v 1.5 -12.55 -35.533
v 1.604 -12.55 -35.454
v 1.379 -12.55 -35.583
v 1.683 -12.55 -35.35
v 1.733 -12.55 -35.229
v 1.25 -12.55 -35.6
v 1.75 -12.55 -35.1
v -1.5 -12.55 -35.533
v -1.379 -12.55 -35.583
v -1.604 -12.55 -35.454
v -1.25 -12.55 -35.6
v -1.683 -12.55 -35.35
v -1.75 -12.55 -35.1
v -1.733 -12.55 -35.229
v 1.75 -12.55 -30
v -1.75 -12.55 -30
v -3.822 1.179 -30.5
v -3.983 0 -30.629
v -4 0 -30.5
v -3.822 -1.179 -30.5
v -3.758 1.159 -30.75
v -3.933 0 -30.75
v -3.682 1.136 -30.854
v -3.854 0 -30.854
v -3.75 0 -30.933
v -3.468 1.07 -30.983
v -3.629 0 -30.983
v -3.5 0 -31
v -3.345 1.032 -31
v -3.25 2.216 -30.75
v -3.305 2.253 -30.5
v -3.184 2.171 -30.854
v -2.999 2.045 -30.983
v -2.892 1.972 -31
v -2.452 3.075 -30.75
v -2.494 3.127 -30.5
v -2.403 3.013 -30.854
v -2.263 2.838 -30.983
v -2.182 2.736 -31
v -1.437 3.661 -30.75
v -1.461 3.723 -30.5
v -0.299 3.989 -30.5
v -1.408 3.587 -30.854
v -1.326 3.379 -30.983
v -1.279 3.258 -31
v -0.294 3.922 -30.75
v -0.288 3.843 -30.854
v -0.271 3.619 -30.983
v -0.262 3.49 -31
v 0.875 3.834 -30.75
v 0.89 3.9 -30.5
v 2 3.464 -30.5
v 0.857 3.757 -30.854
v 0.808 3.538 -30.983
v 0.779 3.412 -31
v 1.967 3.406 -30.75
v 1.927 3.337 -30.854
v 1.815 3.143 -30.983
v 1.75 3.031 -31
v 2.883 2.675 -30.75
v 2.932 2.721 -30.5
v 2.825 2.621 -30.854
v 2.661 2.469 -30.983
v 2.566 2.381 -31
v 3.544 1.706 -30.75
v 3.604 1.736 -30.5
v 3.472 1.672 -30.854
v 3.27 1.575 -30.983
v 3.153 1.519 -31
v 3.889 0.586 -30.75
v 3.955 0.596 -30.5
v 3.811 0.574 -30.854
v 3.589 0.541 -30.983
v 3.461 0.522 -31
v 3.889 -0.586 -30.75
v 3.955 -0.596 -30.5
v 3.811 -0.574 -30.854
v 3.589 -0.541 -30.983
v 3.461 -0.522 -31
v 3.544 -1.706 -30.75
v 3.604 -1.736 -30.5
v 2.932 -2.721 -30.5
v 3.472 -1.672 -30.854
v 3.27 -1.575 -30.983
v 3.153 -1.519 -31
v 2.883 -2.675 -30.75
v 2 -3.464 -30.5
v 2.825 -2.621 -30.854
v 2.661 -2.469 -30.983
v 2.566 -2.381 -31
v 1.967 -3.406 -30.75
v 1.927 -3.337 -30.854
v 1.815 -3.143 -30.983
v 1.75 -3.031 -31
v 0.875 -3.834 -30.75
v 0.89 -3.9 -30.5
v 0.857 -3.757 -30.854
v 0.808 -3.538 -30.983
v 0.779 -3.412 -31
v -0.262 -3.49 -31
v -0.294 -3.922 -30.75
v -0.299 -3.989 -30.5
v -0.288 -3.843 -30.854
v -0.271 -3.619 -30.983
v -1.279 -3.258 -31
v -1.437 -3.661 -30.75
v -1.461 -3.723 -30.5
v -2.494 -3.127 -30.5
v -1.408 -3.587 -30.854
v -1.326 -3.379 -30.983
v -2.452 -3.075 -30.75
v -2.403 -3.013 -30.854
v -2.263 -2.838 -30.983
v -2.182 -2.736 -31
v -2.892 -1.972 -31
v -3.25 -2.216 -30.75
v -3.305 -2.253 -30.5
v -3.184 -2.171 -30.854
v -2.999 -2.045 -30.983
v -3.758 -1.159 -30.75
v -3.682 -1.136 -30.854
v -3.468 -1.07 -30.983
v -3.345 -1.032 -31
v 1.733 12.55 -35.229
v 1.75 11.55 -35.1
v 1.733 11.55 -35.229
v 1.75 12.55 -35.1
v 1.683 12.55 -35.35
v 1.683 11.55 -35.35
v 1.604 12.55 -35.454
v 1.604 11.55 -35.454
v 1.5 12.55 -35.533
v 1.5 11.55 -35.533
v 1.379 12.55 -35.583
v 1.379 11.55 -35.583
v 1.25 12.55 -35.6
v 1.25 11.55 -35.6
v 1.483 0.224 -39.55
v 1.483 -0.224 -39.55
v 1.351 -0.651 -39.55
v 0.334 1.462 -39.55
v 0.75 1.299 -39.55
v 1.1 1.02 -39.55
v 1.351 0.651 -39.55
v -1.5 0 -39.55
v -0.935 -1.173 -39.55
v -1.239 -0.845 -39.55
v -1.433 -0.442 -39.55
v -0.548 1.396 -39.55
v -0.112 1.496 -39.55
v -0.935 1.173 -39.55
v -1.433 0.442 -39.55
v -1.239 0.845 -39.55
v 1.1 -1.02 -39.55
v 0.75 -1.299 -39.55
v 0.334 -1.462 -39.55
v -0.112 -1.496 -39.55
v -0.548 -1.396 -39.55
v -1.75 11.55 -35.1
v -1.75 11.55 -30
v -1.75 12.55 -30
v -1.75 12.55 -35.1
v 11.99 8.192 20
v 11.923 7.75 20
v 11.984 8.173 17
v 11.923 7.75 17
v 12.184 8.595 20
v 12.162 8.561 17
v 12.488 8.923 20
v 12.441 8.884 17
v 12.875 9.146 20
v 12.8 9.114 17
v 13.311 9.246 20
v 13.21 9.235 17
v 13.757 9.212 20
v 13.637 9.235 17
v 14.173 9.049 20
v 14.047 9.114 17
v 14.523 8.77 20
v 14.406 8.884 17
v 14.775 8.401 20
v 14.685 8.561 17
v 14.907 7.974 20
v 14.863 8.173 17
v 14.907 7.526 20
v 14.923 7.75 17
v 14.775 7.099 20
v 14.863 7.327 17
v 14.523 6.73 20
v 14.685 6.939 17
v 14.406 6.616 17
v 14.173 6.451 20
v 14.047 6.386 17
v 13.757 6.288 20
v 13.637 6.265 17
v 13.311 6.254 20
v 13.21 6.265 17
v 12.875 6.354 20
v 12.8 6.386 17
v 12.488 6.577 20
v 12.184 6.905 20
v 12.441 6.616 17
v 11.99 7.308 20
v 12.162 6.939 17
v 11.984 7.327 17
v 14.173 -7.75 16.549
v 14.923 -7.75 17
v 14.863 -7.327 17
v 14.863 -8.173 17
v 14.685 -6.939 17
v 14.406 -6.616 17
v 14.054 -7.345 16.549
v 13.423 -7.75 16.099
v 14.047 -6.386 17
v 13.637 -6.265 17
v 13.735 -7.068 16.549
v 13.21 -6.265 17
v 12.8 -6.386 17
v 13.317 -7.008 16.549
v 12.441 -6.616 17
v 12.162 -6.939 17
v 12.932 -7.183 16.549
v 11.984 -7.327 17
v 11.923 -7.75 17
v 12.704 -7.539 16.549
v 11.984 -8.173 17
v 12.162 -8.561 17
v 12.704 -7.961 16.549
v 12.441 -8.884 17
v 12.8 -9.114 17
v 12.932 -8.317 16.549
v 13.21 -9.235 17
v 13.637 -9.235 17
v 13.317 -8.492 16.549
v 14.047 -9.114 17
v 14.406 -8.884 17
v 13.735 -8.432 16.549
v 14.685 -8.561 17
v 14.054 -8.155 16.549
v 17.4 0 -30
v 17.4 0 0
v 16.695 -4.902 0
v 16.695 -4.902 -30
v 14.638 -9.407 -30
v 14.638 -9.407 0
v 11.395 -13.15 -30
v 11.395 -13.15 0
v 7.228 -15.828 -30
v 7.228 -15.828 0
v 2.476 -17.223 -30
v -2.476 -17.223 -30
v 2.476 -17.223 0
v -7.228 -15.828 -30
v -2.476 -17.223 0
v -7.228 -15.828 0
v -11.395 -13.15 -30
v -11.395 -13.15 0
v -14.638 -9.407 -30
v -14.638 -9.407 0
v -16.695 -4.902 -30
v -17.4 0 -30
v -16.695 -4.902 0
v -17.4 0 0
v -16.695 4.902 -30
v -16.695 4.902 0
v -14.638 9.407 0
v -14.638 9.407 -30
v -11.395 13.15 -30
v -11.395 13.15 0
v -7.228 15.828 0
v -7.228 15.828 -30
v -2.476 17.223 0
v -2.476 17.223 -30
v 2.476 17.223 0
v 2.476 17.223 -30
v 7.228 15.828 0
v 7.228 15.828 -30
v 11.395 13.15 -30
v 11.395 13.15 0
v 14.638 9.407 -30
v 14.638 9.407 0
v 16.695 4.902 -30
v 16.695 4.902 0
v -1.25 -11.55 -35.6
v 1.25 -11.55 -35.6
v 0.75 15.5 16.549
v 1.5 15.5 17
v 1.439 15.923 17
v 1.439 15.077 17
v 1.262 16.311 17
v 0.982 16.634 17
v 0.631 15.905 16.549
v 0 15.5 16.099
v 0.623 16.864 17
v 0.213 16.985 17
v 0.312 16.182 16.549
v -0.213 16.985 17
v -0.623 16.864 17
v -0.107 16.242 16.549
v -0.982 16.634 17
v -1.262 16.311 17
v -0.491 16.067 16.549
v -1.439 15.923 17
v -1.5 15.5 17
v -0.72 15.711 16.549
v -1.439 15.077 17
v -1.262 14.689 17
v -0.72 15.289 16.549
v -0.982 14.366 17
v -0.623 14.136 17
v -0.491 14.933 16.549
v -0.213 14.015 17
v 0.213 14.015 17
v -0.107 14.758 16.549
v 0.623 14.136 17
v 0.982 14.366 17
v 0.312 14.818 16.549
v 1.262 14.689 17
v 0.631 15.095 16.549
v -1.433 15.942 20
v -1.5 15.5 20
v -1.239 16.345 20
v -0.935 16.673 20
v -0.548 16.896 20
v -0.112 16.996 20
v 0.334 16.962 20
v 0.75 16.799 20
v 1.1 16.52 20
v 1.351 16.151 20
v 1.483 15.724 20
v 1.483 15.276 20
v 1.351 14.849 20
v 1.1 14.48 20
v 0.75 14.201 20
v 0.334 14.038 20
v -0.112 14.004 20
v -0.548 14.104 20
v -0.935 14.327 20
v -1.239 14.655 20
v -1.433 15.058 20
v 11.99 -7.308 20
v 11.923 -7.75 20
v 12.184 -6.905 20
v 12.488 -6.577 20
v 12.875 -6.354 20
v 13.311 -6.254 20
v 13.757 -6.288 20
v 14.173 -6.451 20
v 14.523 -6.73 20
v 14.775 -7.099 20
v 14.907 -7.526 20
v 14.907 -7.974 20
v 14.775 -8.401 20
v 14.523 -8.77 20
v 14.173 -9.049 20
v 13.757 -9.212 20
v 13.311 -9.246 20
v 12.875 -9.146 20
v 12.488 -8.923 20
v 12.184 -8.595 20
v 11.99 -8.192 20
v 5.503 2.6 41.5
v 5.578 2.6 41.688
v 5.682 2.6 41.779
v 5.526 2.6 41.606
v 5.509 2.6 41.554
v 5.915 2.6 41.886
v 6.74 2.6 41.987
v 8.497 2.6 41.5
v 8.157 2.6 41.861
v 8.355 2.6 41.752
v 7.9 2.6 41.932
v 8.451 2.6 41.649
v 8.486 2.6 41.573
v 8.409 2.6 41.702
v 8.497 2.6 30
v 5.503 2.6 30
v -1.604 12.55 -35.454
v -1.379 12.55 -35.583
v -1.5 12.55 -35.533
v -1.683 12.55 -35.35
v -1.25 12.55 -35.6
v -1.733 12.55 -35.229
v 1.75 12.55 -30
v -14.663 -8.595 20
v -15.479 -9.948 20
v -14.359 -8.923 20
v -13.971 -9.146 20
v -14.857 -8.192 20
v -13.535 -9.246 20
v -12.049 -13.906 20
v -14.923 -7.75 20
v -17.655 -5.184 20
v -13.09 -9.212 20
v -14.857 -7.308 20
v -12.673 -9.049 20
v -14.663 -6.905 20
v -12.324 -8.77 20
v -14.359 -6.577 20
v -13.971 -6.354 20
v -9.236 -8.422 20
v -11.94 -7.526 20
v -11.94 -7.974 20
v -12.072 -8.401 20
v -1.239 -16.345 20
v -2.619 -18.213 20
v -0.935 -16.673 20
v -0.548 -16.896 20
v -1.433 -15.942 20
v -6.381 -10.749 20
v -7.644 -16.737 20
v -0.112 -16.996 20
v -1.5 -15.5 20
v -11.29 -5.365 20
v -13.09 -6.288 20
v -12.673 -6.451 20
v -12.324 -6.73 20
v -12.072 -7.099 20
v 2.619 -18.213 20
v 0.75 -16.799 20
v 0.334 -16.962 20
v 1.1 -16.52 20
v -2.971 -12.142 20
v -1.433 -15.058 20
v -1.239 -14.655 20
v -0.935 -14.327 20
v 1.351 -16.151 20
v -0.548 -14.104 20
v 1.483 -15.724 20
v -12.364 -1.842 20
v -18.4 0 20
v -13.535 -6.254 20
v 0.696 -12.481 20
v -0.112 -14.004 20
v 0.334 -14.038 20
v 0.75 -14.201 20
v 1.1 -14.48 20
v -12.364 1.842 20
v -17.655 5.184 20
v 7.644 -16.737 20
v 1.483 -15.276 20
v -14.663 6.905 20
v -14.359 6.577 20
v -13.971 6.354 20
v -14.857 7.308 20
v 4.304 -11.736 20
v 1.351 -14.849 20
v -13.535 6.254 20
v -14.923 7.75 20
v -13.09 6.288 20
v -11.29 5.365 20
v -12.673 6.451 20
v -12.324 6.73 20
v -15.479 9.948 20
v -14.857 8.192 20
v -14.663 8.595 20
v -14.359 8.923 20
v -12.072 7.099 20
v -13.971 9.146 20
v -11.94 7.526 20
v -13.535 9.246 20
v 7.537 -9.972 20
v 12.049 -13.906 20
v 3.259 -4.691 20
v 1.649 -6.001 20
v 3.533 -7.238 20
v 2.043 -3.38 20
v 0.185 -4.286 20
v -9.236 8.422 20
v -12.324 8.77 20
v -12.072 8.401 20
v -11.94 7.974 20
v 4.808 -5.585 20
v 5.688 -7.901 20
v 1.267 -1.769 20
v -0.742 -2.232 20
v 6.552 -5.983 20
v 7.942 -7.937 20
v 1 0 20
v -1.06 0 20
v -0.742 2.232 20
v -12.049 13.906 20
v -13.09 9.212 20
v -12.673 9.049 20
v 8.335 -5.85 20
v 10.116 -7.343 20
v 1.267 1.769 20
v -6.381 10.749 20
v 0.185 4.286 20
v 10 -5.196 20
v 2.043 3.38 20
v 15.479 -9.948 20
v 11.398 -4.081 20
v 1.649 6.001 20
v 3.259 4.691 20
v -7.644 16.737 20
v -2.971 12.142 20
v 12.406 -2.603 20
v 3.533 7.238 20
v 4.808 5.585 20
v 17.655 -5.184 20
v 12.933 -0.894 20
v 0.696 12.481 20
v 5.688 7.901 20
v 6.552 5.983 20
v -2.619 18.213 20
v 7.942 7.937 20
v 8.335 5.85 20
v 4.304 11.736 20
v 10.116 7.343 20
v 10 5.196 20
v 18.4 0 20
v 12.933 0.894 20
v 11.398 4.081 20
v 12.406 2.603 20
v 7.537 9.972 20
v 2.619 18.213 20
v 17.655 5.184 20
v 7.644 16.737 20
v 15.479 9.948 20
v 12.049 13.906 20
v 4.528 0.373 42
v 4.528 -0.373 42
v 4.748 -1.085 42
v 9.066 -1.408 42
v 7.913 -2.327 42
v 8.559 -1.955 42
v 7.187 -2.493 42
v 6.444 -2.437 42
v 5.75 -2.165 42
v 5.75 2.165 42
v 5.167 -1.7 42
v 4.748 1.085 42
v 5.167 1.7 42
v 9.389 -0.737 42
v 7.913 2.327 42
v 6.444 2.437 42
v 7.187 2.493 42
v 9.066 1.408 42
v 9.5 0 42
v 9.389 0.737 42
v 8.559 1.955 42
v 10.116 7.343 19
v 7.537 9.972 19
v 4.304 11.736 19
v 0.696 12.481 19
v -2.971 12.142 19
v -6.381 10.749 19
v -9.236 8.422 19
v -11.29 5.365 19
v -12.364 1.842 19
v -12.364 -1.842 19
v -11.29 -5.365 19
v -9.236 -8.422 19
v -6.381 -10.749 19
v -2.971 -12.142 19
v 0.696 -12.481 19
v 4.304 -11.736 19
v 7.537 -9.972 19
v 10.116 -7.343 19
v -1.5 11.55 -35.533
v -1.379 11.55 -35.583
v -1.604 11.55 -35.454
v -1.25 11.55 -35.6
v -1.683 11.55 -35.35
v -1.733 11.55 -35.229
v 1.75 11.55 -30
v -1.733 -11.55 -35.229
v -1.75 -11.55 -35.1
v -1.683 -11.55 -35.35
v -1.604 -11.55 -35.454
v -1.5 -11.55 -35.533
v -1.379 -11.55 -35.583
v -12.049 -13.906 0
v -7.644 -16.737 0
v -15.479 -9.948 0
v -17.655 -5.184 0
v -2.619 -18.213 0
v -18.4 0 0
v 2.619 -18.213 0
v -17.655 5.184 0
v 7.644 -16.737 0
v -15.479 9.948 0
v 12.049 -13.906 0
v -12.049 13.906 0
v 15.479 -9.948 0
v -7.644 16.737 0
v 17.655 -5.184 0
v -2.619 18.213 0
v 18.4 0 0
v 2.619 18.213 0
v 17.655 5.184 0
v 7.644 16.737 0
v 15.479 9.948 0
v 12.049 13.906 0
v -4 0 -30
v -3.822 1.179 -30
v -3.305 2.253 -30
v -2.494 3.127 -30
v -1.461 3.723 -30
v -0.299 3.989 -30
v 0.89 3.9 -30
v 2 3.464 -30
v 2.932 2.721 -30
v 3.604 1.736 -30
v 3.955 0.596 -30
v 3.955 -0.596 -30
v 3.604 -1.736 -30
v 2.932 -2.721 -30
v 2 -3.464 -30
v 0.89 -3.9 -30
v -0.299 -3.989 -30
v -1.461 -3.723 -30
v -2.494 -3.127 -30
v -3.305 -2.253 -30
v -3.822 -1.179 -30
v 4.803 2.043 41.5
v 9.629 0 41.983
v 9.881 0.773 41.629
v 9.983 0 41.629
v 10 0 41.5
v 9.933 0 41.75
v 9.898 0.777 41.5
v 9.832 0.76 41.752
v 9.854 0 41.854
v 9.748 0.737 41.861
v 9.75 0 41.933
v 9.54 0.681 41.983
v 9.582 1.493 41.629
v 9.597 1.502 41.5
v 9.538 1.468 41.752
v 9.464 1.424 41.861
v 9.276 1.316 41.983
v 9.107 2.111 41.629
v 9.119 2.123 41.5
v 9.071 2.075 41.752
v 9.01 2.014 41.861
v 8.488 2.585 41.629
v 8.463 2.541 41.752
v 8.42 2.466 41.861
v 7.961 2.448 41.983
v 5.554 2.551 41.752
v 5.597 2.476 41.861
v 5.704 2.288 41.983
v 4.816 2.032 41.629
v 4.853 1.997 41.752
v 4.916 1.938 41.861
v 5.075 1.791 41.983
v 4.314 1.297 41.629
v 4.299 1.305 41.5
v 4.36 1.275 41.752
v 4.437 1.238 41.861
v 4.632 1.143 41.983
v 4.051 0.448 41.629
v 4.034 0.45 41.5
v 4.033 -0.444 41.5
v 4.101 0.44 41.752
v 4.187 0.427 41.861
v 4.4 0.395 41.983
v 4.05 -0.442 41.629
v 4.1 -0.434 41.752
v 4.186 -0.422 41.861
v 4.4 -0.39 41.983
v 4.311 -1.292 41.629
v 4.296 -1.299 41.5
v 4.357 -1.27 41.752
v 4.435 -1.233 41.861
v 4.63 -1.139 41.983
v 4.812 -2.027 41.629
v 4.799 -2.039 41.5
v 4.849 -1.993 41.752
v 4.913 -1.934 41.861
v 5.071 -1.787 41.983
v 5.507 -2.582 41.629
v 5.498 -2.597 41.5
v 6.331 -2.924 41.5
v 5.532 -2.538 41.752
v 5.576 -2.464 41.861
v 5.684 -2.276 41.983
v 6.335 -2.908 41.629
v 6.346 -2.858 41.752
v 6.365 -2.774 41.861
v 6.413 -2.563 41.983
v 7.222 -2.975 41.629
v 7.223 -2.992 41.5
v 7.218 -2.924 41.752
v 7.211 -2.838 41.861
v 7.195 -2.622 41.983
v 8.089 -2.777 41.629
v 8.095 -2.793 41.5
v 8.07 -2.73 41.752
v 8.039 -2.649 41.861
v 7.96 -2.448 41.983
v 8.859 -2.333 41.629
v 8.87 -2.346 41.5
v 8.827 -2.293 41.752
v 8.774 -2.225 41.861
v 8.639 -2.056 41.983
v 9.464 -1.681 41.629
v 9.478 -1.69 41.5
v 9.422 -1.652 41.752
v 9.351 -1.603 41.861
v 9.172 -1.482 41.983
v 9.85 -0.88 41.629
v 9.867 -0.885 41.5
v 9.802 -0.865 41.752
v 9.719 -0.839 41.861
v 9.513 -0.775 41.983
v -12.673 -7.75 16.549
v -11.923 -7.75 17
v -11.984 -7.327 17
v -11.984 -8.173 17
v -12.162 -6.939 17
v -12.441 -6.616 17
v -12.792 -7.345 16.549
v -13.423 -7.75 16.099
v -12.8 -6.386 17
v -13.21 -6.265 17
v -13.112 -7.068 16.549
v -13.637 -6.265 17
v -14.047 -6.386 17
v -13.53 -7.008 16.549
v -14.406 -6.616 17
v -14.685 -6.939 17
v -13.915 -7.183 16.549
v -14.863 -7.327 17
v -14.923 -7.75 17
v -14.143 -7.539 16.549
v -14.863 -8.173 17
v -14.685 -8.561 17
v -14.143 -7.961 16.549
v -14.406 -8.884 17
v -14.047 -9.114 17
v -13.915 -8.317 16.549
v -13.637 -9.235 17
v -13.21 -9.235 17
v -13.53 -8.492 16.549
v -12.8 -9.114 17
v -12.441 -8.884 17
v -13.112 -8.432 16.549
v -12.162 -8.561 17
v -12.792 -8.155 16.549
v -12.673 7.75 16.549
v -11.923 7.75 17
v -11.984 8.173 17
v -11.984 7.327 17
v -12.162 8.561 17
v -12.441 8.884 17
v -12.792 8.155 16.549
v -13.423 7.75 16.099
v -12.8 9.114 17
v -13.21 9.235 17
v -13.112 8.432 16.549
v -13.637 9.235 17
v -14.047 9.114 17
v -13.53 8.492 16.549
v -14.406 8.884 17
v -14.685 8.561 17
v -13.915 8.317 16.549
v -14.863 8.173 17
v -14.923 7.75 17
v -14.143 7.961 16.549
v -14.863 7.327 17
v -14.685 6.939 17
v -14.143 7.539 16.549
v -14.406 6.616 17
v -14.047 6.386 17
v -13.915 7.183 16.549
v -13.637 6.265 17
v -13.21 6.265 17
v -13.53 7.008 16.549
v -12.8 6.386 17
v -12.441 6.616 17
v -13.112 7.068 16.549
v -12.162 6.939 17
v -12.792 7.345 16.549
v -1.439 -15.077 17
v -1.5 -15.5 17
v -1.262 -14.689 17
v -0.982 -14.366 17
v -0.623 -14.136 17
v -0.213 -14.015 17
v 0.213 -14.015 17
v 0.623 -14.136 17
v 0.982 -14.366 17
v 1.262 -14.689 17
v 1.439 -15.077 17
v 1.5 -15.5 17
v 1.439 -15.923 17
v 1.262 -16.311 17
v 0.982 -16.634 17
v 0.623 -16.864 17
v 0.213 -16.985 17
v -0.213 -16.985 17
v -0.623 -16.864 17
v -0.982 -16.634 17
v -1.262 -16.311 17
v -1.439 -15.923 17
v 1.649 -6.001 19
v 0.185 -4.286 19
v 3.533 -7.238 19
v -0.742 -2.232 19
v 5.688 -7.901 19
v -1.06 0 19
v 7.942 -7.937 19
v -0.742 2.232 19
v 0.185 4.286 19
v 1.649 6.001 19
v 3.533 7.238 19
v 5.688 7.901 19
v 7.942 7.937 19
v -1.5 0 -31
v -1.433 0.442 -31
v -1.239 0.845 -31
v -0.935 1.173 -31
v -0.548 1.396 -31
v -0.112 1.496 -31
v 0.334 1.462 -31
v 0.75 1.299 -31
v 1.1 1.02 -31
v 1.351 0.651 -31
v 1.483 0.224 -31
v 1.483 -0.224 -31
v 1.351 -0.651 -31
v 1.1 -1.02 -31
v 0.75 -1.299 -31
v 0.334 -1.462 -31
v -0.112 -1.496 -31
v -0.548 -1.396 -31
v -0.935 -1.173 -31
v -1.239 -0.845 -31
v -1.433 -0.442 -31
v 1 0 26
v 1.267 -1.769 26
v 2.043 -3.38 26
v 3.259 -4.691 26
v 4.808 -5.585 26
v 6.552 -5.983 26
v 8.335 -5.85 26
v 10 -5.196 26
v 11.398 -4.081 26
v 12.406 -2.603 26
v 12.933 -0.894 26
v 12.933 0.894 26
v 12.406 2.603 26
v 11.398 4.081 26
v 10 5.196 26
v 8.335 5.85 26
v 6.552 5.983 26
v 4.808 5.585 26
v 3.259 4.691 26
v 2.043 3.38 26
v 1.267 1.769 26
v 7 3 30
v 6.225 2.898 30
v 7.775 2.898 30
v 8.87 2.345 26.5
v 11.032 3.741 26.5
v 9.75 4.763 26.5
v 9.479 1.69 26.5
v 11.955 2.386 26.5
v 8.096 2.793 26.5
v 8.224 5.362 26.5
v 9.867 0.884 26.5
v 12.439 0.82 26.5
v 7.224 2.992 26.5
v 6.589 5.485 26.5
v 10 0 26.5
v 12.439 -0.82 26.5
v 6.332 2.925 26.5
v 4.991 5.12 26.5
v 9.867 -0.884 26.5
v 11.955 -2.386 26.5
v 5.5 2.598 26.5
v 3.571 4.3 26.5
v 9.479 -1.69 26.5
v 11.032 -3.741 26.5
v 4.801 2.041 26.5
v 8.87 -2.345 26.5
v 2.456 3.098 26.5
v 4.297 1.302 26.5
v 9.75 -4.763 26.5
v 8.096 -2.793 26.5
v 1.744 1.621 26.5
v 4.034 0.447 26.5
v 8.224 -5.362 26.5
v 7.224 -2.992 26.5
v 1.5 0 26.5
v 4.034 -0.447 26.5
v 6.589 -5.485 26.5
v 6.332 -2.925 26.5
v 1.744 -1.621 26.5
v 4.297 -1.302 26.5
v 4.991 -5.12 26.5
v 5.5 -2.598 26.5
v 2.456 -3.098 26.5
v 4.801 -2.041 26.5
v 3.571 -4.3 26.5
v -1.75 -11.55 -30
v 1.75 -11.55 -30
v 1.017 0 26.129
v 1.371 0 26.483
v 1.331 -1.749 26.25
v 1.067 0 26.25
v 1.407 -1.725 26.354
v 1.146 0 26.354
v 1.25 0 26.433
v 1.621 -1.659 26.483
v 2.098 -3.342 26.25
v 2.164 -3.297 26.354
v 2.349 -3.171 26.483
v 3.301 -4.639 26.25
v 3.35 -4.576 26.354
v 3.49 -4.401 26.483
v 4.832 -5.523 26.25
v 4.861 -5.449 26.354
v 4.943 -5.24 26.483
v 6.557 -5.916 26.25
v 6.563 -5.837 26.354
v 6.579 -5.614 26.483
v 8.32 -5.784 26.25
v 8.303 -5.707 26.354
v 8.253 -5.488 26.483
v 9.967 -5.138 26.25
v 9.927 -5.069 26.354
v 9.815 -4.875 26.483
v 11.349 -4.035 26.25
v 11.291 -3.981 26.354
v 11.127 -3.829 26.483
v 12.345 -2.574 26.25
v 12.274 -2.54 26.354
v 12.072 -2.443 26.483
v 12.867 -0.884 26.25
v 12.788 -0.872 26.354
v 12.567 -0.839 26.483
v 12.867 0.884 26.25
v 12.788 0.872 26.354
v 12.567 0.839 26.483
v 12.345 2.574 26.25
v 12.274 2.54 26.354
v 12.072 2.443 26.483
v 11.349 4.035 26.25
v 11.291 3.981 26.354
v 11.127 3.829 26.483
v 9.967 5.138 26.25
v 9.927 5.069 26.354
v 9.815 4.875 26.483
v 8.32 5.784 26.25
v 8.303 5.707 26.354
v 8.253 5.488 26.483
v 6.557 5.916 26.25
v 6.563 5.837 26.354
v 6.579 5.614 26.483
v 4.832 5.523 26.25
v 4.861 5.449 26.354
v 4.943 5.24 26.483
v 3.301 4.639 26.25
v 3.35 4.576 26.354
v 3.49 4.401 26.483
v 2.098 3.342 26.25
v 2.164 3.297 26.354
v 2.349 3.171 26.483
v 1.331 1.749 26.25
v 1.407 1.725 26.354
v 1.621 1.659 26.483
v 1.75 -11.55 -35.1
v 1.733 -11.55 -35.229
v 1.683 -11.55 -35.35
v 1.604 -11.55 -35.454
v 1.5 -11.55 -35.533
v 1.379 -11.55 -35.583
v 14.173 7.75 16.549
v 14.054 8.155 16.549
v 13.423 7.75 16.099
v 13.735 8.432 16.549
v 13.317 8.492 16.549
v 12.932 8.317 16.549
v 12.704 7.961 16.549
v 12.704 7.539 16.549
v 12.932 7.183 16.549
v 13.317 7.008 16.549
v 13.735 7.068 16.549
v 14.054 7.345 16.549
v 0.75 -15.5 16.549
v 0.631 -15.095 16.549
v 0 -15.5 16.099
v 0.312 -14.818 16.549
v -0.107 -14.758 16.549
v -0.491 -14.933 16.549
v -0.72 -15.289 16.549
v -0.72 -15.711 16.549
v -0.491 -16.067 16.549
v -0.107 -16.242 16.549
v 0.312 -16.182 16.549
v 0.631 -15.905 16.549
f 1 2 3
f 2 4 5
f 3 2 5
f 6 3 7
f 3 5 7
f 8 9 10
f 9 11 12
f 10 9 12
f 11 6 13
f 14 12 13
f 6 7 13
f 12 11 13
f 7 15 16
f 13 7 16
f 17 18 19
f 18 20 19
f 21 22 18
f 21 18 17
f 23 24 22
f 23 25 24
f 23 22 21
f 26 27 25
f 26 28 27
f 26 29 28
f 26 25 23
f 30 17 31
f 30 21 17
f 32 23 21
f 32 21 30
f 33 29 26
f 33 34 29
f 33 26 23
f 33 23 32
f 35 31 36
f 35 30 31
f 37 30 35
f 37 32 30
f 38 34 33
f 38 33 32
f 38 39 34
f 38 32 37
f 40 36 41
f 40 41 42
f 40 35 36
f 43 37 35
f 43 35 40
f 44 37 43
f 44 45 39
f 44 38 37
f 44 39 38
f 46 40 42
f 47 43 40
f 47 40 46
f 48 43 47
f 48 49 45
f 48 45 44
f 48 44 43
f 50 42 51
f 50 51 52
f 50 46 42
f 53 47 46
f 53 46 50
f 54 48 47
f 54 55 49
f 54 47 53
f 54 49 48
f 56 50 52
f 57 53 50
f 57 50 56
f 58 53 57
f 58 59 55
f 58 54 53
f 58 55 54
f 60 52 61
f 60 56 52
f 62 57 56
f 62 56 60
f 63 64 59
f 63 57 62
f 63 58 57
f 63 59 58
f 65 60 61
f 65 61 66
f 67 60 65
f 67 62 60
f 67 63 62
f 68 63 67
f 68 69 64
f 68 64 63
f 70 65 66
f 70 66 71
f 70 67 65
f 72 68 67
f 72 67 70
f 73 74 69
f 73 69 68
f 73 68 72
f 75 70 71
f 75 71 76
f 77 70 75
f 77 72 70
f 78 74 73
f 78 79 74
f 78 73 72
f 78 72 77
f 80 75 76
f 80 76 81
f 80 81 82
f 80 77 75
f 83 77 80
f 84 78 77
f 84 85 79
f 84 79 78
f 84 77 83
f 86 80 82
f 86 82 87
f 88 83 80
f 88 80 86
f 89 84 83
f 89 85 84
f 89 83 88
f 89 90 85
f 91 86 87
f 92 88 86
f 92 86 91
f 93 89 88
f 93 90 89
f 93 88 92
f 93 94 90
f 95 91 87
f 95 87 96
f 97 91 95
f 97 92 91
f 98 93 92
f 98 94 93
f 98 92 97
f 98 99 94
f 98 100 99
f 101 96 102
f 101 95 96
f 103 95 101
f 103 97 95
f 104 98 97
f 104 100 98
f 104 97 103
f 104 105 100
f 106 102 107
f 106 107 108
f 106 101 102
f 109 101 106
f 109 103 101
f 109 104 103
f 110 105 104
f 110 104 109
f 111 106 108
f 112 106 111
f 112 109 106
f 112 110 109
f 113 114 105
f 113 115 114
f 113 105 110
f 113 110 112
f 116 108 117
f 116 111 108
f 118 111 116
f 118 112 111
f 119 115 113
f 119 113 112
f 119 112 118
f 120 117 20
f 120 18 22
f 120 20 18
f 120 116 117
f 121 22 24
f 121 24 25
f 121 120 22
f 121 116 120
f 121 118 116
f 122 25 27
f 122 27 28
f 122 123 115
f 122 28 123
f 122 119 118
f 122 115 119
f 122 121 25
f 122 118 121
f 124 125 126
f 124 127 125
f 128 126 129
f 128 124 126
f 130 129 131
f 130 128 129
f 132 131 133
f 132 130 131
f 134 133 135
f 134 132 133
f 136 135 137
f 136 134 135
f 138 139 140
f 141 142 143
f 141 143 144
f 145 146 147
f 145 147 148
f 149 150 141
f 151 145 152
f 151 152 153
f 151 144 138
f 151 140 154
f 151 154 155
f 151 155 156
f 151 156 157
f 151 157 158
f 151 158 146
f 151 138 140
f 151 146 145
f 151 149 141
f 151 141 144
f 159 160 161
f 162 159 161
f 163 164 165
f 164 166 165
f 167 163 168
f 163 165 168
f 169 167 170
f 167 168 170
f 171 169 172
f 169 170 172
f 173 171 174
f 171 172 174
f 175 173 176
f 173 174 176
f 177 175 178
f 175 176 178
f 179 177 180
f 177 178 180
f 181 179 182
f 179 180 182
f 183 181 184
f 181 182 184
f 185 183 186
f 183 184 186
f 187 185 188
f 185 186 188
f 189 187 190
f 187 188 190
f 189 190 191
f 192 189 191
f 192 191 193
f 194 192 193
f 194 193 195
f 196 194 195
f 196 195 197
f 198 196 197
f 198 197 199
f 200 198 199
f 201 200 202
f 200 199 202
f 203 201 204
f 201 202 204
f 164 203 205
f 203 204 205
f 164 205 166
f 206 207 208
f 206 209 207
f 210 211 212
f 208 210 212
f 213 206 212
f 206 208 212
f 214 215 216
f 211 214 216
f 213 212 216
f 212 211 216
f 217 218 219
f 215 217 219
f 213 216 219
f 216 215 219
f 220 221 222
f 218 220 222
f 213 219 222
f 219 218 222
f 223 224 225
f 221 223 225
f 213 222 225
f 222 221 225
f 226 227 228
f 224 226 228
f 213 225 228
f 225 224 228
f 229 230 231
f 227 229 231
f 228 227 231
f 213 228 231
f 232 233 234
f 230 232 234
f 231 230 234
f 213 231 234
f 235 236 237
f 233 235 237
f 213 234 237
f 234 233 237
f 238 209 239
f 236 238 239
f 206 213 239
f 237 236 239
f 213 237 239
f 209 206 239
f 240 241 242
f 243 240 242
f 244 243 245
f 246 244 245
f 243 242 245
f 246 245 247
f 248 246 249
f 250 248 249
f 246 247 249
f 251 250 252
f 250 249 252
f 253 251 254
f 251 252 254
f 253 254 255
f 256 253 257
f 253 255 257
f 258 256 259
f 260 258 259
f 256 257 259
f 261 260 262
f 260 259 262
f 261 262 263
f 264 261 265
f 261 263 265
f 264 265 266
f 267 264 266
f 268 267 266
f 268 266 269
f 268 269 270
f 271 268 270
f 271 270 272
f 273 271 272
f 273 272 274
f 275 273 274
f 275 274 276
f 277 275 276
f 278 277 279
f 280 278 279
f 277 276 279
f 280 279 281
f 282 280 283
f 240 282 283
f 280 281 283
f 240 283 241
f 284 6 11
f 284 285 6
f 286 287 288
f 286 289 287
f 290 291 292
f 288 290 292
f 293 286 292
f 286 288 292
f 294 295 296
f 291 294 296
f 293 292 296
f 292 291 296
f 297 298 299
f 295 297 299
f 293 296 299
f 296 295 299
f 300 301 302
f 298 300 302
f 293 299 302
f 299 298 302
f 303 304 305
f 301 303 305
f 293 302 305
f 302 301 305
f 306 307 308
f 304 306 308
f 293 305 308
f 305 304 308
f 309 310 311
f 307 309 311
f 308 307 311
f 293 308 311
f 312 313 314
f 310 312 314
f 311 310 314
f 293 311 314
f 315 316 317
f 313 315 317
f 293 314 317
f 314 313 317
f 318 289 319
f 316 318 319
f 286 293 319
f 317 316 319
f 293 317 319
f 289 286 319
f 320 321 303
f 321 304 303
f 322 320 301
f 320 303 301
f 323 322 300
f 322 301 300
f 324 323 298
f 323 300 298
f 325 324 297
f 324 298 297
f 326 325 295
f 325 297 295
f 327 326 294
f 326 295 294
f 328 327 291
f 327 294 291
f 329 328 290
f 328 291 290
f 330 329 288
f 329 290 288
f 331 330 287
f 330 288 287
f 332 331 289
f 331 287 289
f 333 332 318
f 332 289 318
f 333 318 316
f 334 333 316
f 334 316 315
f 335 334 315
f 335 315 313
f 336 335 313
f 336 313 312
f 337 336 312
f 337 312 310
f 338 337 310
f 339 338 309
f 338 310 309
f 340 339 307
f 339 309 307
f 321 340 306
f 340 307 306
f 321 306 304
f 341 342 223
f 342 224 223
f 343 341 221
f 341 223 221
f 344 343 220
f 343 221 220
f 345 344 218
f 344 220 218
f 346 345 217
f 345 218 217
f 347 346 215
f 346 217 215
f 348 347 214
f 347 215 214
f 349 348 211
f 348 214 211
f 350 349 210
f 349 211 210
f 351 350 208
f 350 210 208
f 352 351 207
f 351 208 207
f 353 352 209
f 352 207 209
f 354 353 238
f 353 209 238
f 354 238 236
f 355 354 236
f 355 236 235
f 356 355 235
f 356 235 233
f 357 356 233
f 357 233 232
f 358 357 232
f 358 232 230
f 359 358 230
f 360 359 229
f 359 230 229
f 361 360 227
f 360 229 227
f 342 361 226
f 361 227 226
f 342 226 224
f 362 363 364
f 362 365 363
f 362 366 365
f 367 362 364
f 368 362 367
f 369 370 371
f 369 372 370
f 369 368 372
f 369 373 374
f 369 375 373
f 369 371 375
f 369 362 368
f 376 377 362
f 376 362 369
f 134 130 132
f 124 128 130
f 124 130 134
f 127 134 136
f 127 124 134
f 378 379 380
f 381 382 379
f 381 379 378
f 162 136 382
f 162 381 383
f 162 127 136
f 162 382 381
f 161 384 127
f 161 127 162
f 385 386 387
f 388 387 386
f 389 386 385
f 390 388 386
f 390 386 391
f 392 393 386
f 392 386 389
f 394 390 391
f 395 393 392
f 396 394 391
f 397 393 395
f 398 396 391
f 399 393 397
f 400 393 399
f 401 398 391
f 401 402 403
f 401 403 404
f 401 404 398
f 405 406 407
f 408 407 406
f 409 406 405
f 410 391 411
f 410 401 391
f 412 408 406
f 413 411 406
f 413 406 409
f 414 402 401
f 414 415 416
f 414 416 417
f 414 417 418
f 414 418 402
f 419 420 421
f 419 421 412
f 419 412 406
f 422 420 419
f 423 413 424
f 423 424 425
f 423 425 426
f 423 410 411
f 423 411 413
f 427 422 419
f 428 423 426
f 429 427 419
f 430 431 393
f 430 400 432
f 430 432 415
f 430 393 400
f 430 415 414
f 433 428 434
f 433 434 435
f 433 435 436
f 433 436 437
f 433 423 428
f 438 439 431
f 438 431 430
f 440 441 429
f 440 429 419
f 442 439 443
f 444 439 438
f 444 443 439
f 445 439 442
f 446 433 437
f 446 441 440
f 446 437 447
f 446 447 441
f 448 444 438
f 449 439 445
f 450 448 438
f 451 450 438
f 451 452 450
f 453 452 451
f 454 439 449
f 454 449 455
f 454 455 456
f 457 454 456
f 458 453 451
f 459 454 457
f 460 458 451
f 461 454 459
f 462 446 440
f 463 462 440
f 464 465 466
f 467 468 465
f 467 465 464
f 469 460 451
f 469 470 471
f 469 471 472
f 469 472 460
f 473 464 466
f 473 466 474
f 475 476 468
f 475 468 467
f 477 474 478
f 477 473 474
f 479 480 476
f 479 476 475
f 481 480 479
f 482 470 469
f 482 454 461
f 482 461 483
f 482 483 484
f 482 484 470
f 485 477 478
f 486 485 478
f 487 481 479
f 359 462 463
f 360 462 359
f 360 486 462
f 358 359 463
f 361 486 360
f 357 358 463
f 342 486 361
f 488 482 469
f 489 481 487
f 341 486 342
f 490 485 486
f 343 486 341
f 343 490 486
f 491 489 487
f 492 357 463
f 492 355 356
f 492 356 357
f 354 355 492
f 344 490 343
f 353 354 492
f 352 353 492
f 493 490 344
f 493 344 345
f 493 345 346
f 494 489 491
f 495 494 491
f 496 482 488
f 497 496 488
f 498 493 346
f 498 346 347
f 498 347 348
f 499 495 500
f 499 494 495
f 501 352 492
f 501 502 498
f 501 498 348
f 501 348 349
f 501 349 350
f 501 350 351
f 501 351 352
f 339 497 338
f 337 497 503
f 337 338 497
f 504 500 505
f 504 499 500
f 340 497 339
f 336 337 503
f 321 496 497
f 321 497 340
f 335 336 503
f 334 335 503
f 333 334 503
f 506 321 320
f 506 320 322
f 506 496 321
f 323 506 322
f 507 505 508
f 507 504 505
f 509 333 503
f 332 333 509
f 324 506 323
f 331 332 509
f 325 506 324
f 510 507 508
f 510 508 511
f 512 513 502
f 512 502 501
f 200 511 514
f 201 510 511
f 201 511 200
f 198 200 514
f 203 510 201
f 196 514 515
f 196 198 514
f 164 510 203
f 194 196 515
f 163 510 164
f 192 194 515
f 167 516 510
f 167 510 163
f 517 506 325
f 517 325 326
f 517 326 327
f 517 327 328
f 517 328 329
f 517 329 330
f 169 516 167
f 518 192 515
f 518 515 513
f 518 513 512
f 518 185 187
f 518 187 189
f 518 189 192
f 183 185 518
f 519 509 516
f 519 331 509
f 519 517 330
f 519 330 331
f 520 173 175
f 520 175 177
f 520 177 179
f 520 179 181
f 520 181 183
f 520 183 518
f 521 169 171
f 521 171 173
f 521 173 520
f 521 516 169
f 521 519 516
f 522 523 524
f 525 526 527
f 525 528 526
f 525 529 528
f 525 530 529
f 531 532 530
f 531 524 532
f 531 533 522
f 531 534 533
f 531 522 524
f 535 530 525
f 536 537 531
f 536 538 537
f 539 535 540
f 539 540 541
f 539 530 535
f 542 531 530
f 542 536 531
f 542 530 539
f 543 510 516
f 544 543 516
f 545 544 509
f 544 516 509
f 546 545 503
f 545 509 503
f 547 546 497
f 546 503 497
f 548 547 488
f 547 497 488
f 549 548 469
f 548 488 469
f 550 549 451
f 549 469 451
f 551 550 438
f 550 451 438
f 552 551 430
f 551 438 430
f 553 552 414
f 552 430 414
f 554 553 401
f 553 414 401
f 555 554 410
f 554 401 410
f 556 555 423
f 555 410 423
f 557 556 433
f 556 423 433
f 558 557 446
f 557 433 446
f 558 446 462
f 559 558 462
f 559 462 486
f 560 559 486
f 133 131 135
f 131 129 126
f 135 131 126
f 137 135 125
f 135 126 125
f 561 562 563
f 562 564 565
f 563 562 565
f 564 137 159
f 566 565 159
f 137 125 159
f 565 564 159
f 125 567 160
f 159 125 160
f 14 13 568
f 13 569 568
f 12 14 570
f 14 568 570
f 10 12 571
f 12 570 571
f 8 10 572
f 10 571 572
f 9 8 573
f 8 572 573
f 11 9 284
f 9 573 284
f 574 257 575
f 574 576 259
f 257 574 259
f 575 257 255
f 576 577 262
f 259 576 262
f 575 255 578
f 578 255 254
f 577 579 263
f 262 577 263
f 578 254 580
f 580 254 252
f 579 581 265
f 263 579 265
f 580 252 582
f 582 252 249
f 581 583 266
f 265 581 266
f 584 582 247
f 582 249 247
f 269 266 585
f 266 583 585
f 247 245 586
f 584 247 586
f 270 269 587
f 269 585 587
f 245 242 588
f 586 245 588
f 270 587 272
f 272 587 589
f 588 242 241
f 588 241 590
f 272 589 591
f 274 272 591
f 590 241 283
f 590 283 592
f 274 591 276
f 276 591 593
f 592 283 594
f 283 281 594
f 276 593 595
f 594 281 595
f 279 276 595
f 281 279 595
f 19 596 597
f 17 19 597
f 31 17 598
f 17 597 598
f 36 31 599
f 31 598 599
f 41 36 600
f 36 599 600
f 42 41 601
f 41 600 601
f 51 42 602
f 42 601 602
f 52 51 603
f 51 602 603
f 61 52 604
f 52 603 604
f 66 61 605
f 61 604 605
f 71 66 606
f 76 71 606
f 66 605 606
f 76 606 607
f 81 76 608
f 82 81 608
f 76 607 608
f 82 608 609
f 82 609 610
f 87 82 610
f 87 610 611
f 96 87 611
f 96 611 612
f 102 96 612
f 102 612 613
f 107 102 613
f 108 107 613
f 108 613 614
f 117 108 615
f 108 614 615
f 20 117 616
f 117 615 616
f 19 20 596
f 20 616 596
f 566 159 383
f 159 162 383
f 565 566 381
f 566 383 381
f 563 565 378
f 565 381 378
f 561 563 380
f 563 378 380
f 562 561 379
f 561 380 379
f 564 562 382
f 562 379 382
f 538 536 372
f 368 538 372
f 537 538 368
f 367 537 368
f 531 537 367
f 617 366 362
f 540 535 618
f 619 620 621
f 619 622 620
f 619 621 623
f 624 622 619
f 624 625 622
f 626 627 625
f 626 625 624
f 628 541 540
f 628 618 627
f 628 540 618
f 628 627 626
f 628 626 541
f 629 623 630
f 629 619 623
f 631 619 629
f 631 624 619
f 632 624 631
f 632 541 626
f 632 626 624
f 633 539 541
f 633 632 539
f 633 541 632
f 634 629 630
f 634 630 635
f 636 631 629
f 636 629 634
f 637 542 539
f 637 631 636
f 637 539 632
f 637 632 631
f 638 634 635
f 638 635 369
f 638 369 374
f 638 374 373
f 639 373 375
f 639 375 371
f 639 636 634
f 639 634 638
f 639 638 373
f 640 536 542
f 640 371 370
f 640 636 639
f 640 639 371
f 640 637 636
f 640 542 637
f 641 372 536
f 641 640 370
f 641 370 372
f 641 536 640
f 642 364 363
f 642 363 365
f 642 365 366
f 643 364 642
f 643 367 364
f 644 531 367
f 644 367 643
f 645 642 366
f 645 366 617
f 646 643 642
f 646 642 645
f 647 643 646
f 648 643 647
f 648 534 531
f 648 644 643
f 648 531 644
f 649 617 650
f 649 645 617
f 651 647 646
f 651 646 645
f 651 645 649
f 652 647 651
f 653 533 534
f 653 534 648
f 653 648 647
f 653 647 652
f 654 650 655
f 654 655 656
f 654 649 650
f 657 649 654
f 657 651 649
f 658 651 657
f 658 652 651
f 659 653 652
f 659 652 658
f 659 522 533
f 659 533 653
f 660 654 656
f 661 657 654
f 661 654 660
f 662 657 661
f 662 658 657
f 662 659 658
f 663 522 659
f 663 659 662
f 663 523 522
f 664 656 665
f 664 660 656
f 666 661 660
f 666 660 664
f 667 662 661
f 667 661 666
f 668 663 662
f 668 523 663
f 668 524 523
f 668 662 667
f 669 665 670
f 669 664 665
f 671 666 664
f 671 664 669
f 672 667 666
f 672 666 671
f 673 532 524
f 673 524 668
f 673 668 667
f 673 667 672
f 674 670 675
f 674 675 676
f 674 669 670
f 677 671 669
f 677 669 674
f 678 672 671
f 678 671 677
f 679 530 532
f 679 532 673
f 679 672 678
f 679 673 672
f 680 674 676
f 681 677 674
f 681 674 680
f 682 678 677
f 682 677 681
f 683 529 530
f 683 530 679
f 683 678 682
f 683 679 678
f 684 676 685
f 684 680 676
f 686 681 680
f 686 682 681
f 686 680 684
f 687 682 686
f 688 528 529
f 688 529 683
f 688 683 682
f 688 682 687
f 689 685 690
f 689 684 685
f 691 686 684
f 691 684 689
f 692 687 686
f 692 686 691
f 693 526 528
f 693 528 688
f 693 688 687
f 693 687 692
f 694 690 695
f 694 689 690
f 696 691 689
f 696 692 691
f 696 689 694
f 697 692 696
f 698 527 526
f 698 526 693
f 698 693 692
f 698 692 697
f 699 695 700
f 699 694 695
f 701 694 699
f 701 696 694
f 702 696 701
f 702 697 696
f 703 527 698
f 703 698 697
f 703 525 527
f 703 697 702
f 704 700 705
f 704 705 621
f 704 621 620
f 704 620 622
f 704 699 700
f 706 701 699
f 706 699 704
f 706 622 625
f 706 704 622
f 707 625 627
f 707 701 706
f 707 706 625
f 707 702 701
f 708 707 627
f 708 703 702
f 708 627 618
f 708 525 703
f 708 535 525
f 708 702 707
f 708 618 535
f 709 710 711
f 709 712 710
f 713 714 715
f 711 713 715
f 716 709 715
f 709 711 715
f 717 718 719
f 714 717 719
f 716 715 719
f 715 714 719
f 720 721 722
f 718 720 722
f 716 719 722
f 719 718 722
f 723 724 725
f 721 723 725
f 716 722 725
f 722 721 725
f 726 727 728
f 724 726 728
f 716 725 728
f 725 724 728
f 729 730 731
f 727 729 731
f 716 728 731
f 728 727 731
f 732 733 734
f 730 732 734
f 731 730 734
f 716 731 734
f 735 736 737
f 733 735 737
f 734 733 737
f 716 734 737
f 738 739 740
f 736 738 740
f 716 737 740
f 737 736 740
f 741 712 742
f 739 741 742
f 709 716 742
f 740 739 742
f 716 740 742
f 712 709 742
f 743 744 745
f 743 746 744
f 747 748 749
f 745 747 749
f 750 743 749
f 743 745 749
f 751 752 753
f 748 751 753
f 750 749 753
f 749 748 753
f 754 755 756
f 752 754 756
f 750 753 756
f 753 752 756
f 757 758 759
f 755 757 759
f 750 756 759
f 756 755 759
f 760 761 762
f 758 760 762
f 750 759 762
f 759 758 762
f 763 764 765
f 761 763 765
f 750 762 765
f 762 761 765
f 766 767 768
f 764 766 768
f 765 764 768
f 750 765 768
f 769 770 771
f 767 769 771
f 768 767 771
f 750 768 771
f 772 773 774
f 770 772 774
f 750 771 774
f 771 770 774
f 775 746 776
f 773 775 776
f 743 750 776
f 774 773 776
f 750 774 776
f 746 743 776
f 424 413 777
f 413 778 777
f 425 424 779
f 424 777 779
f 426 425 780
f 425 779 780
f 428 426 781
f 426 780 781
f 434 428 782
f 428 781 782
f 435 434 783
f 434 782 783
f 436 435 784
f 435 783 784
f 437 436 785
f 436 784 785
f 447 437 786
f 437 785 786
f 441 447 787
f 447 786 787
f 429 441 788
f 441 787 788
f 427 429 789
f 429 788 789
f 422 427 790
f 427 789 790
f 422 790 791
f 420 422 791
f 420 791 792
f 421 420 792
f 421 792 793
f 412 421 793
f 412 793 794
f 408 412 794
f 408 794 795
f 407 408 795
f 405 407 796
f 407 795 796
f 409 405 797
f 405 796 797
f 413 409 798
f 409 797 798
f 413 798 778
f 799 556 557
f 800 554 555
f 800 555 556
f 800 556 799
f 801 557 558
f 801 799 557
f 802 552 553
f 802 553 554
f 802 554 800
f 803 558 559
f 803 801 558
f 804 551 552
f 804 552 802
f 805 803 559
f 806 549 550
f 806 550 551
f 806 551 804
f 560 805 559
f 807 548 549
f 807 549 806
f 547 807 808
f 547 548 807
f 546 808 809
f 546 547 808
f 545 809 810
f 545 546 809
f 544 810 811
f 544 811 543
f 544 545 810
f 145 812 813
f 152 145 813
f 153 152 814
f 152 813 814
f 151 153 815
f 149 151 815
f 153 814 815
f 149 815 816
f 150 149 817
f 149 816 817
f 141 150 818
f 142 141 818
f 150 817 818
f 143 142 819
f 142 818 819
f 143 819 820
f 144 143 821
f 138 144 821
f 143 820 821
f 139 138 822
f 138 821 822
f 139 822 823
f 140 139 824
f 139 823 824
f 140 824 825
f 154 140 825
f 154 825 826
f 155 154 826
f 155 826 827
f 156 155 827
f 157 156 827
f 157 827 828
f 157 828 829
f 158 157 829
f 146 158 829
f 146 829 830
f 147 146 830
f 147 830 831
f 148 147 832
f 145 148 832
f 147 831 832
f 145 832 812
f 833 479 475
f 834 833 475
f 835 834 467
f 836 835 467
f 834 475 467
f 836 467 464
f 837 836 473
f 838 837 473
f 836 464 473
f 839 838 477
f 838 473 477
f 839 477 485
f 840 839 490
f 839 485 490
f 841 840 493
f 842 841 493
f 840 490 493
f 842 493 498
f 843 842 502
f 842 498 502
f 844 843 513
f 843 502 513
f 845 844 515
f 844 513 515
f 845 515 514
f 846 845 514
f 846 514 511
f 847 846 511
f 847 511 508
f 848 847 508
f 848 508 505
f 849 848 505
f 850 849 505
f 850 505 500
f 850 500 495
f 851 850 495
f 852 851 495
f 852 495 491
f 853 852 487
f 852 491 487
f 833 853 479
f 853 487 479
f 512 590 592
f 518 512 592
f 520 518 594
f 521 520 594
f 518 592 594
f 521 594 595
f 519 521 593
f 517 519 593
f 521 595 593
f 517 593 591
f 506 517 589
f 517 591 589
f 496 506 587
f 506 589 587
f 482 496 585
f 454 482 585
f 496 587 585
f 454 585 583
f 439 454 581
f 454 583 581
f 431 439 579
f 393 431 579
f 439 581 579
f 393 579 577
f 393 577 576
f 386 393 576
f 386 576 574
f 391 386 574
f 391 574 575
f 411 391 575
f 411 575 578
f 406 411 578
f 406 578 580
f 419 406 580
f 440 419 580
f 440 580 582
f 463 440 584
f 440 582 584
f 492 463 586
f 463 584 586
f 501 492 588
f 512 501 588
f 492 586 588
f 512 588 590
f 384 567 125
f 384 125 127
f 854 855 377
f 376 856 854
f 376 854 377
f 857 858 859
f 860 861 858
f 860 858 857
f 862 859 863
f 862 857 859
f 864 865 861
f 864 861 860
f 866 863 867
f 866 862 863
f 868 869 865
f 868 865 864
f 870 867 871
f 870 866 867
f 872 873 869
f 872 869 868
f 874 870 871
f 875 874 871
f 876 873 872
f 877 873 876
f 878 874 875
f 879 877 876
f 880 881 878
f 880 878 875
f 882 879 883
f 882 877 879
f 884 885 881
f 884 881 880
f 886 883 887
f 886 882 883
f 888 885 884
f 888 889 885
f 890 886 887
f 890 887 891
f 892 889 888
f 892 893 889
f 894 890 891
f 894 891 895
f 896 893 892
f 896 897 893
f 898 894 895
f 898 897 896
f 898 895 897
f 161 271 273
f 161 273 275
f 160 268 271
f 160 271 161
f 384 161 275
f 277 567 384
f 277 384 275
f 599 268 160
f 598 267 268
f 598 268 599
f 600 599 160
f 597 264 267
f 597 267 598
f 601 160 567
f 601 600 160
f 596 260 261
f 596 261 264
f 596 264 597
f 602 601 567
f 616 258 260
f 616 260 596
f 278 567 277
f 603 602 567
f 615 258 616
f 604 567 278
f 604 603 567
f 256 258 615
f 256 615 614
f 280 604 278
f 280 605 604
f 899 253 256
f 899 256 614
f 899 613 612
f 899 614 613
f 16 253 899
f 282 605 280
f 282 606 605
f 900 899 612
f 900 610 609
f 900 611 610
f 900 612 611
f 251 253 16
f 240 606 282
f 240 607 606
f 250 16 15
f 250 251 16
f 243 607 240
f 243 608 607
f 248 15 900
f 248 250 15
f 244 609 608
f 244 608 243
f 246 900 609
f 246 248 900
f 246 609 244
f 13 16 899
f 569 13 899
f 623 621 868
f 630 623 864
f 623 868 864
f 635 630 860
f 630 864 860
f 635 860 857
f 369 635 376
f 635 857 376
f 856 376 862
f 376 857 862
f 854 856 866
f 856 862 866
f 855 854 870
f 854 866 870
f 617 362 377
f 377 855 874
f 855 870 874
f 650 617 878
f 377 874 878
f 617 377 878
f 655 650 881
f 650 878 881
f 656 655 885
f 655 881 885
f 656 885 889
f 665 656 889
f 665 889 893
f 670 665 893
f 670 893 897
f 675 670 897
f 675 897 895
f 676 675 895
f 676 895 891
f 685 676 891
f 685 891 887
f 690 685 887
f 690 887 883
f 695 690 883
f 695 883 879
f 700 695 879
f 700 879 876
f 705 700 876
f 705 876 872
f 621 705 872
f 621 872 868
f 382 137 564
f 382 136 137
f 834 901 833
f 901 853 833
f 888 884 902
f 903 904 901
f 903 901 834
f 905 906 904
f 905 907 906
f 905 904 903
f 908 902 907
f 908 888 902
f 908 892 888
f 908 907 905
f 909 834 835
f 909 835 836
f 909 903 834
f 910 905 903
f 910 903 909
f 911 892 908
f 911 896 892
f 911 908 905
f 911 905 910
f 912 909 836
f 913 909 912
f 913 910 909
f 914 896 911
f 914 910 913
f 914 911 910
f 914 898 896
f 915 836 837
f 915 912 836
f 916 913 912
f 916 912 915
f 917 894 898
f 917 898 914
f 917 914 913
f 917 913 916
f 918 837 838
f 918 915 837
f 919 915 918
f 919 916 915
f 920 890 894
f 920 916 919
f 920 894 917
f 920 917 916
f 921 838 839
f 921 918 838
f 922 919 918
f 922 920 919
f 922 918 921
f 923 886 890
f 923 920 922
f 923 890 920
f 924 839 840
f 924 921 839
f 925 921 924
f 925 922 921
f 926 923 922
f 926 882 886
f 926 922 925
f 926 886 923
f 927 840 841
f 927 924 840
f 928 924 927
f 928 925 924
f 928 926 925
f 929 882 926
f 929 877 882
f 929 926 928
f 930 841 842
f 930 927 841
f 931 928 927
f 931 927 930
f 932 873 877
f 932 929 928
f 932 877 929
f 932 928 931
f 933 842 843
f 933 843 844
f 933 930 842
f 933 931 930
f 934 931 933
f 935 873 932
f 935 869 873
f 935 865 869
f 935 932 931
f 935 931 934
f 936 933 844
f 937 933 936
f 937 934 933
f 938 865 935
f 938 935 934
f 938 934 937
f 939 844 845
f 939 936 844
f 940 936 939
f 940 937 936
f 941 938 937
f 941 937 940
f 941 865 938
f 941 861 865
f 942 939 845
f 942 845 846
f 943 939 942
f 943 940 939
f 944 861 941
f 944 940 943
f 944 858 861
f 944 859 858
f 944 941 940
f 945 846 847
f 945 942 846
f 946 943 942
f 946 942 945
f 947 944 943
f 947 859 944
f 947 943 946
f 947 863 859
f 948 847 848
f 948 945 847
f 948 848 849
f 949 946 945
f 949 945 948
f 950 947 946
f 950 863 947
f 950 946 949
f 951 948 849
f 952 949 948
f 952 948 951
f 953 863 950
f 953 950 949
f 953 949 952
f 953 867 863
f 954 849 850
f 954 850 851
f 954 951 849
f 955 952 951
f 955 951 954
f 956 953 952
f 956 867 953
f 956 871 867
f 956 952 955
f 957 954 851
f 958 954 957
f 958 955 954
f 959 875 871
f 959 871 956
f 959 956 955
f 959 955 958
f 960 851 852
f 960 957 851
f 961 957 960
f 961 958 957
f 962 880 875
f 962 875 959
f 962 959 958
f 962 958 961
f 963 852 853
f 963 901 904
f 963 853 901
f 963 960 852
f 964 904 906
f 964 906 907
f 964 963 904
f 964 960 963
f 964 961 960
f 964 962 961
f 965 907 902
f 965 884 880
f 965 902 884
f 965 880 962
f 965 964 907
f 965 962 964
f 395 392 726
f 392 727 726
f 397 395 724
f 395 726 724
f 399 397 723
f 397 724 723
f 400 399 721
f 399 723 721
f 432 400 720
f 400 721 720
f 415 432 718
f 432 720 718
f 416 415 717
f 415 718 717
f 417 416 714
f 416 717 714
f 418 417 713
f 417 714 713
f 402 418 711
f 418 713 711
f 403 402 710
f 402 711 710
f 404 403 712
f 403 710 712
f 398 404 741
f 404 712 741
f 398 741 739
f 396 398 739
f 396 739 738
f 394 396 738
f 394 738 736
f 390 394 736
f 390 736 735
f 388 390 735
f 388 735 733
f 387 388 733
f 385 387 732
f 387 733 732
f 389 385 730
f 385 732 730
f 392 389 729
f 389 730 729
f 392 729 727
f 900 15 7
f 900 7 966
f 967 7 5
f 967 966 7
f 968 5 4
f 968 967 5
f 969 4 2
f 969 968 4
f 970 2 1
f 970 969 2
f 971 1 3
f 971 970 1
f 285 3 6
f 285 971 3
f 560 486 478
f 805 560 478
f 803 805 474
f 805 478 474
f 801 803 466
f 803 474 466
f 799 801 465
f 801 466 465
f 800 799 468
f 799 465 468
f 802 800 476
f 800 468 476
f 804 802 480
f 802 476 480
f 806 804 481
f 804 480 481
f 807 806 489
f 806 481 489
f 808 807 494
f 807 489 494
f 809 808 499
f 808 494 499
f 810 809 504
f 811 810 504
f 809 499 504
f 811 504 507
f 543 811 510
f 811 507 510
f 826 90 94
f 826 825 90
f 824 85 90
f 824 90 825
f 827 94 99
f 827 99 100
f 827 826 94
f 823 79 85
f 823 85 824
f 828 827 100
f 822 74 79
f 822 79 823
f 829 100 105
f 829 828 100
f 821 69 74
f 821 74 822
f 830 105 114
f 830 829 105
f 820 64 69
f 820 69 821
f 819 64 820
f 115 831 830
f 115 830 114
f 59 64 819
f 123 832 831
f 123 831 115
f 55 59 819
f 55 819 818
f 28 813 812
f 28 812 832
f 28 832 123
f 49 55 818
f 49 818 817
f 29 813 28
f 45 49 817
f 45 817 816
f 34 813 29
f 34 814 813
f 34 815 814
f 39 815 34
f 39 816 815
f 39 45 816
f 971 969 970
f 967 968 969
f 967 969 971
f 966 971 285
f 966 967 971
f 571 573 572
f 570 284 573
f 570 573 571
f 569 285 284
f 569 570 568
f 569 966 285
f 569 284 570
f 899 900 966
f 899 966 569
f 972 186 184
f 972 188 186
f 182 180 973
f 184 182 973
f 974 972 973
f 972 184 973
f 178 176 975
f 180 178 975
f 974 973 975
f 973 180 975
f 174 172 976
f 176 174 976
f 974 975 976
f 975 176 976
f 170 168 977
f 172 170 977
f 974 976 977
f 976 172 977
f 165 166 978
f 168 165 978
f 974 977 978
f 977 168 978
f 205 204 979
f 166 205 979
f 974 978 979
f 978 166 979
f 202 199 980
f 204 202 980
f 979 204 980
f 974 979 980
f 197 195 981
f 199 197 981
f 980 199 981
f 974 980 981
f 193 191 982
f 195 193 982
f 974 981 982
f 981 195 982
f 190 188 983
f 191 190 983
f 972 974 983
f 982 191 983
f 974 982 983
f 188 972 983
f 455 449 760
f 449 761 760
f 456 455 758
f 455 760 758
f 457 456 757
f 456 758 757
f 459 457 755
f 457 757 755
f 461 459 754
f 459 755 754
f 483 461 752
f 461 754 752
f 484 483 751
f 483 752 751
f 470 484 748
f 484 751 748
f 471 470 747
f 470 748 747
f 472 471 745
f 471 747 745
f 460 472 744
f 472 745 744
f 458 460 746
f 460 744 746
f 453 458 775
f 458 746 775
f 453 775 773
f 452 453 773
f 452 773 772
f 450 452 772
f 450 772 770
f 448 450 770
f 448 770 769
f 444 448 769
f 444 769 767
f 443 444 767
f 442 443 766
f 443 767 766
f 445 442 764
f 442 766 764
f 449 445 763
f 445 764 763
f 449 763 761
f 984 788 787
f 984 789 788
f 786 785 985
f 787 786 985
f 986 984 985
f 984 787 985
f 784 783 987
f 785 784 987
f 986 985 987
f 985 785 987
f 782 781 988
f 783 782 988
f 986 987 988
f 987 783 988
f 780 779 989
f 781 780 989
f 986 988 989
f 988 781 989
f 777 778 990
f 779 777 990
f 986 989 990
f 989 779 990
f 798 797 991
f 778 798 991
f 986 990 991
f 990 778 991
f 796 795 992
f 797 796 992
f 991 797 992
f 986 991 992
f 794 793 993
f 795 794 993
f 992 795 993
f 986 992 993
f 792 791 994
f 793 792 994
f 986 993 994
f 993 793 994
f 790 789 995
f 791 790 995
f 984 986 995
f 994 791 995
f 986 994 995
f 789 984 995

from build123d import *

# Parameters (mm, degrees)
SKETCH1_R                    = 18.4
BOSS_EXTRUDE1_DEPTH          = 20
SKETCH2_R                    = 17.4
BOSS_EXTRUDE2_DEPTH          = 30
SKETCH3_R                    = 6
BOSS_EXTRUDE3_DEPTH          = 6.5
FILLET1_R                    = 0.5
SKETCH4_R                    = 3
BOSS_EXTRUDE4_DEPTH          = 15.5
CUT_EXTRUDE1_START           = -12
CUT_EXTRUDE1_DEPTH           = 12
F_3_0_3_DIAMETER_HOLE1_D     = 3
F_3_0_3_DIAMETER_HOLE1_DEPTH = 3
F_3_0_3_DIAMETER_HOLE1_TIP   = 0.901290929
CUT_EXTRUDE2_DEPTH           = 1
SKETCH9_R                    = 4
BOSS_EXTRUDE5_DEPTH          = 1
FILLET2_R                    = 0.5
SKETCH11_W                   = 3.5
SKETCH11_H                   = 1
BOSS_EXTRUDE7_DEPTH          = 5.6
FILLET3_R                    = 0.5
SKETCH14_R                   = 1.5
BOSS_EXTRUDE9_DEPTH          = 8.55
FILLET4_R                    = 0.5


with BuildPart() as part:
    # Sketch1 → Boss-Extrude1 (new body)
    with BuildSketch(Plane.XY):
        Circle(SKETCH1_R)
    extrude(amount=BOSS_EXTRUDE1_DEPTH)

    # Sketch2 → Boss-Extrude2 (add)
    with BuildSketch(Plane(origin=(0, 0, 0), x_dir=(-1, 0, 0), z_dir=(0, 0, -1))):
        with Locations(Location((0, 0, 0), (0, 0, 180))):
            Circle(SKETCH2_R)
    extrude(amount=BOSS_EXTRUDE2_DEPTH)

    # Sketch3 → Boss-Extrude3 (add)
    with BuildSketch(Plane.XY.offset(20)):
        with Locations(Location((7, 0, 0), (0, 0, 180))):
            Circle(SKETCH3_R)
    extrude(amount=BOSS_EXTRUDE3_DEPTH)

    # Fillet1
    fillet1_edges = [part.edges().sort_by_distance(p)[0] for p in [
        (13, 0, 26.5),
    ]]
    fillet(fillet1_edges, radius=FILLET1_R)

    # Sketch4 → Boss-Extrude4 (add)
    with BuildSketch(Plane.XY.offset(26.5)):
        with Locations((7, 0)):
            Circle(SKETCH4_R)
    extrude(amount=BOSS_EXTRUDE4_DEPTH)

    # Sketch5 → Cut-Extrude1 (cut)
    with BuildSketch(Plane.XY.offset(42).offset(CUT_EXTRUDE1_START)):
        with BuildLine():
            Line((5.503337045, 2.6), (8.496662955, 2.6))
            ThreePointArc((8.496662955, 2.6), (7, 3), (5.503337045, 2.6))
        make_face()
    extrude(amount=CUT_EXTRUDE1_DEPTH, mode=Mode.SUBTRACT)

    # Ø3.0 (3) Diameter Hole1
    with Locations(Plane.XY.offset(20)):
        with Locations((-13.423393759, 7.75), (-13.423393759, -7.75), (0, -15.5), (13.423393759, 7.75), (0, 15.5), (13.423393759, -7.75)):
            Hole(F_3_0_3_DIAMETER_HOLE1_D / 2, depth=F_3_0_3_DIAMETER_HOLE1_DEPTH)
            with Locations((0, 0, -(F_3_0_3_DIAMETER_HOLE1_DEPTH + F_3_0_3_DIAMETER_HOLE1_TIP / 2))):  # 118° drill point
                Cone(0, F_3_0_3_DIAMETER_HOLE1_D / 2, F_3_0_3_DIAMETER_HOLE1_TIP, mode=Mode.SUBTRACT)

    # Sketch8 → Cut-Extrude2 (cut)
    with BuildSketch(Plane.XY.offset(20)):
        with BuildLine():
            ThreePointArc((10.116155685, 7.342574083), (-12.5, 0), (10.116155685, -7.342574083))
            ThreePointArc((10.116155685, -7.342574083), (-1.05978604, 0), (10.116155685, 7.342574083))
        make_face()
    extrude(amount=-CUT_EXTRUDE2_DEPTH, mode=Mode.SUBTRACT)

    # Sketch9 → Boss-Extrude5 (add)
    with BuildSketch(Plane(origin=(0, 0, -30), x_dir=(-1, 0, 0), z_dir=(0, 0, -1))):
        Circle(SKETCH9_R)
    extrude(amount=BOSS_EXTRUDE5_DEPTH)

    # Fillet2
    fillet2_edges = [part.edges().sort_by_distance(p)[0] for p in [
        (4, 0, -31),
    ]]
    fillet(fillet2_edges, radius=FILLET2_R)

    # Sketch11 → Boss-Extrude7 (add)
    with BuildSketch(Plane(origin=(0, 0, -30), x_dir=(-1, 0, 0), z_dir=(0, 0, -1))):
        with Locations((0, 12.05)):
            Rectangle(SKETCH11_W, SKETCH11_H)
        with Locations((0, -12.05)):
            Rectangle(SKETCH11_W, SKETCH11_H)
    extrude(amount=BOSS_EXTRUDE7_DEPTH)

    # Fillet3
    fillet3_edges = [part.edges().sort_by_distance(p)[0] for p in [
        (1.75, 12.05, -35.6),
        (-1.75, 12.05, -35.6),
        (-1.75, -12.05, -35.6),
        (1.75, -12.05, -35.6),
    ]]
    fillet(fillet3_edges, radius=FILLET3_R)

    # Sketch14 → Boss-Extrude9 (add)
    with BuildSketch(Plane(origin=(0, 0, -31), x_dir=(-1, 0, 0), z_dir=(0, 0, -1))):
        Circle(SKETCH14_R)
    extrude(amount=BOSS_EXTRUDE9_DEPTH)

    # Fillet4
    # the kernel refuses this fillet: 0.5 mm, written as the material it takes off along each edge
    with BuildSketch(Plane(origin=(7, 0, 42), x_dir=(0.4622655728594592, 0.8867415295050277, 0), z_dir=(0.8867415295050277, -0.4622655728594592, 0))) as fillet4_piece_1:
        with BuildLine():
            CenterArc((3 - FILLET4_R, -FILLET4_R), FILLET4_R, 0, 90)
            Line((3 - FILLET4_R, 0), (3 - FILLET4_R, FILLET4_R * 0.02))
            Line((3 - FILLET4_R, FILLET4_R * 0.02), (3 + FILLET4_R * 0.02, FILLET4_R * 0.02))
            Line((3 + FILLET4_R * 0.02, FILLET4_R * 0.02), (3 + FILLET4_R * 0.02, -FILLET4_R))
            Line((3 + FILLET4_R * 0.02, -FILLET4_R), (3, -FILLET4_R))
        make_face()
    revolve(axis=Axis((7, 0, 42), (0, 0, 1)), revolution_arc=297.533397677, mode=Mode.SUBTRACT)
    with BuildSketch(Plane(origin=(7, 0, 42), x_dir=(1, 0, 0), z_dir=(0, -1, 0))) as fillet4_piece_2:
        with BuildLine():
            CenterArc((3 - FILLET4_R, -FILLET4_R), FILLET4_R, 0, 90)
            Line((3 - FILLET4_R, 0), (3 - FILLET4_R, FILLET4_R * 0.02))
            Line((3 - FILLET4_R, FILLET4_R * 0.02), (3 + FILLET4_R * 0.02, FILLET4_R * 0.02))
            Line((3 + FILLET4_R * 0.02, FILLET4_R * 0.02), (3 + FILLET4_R * 0.02, -FILLET4_R))
            Line((3 + FILLET4_R * 0.02, -FILLET4_R), (3, -FILLET4_R))
        make_face()
    revolve(axis=Axis((7, 0, 42), (0, 0, 1)), revolution_arc=117.379597562, mode=Mode.SUBTRACT)


solid = part.part
